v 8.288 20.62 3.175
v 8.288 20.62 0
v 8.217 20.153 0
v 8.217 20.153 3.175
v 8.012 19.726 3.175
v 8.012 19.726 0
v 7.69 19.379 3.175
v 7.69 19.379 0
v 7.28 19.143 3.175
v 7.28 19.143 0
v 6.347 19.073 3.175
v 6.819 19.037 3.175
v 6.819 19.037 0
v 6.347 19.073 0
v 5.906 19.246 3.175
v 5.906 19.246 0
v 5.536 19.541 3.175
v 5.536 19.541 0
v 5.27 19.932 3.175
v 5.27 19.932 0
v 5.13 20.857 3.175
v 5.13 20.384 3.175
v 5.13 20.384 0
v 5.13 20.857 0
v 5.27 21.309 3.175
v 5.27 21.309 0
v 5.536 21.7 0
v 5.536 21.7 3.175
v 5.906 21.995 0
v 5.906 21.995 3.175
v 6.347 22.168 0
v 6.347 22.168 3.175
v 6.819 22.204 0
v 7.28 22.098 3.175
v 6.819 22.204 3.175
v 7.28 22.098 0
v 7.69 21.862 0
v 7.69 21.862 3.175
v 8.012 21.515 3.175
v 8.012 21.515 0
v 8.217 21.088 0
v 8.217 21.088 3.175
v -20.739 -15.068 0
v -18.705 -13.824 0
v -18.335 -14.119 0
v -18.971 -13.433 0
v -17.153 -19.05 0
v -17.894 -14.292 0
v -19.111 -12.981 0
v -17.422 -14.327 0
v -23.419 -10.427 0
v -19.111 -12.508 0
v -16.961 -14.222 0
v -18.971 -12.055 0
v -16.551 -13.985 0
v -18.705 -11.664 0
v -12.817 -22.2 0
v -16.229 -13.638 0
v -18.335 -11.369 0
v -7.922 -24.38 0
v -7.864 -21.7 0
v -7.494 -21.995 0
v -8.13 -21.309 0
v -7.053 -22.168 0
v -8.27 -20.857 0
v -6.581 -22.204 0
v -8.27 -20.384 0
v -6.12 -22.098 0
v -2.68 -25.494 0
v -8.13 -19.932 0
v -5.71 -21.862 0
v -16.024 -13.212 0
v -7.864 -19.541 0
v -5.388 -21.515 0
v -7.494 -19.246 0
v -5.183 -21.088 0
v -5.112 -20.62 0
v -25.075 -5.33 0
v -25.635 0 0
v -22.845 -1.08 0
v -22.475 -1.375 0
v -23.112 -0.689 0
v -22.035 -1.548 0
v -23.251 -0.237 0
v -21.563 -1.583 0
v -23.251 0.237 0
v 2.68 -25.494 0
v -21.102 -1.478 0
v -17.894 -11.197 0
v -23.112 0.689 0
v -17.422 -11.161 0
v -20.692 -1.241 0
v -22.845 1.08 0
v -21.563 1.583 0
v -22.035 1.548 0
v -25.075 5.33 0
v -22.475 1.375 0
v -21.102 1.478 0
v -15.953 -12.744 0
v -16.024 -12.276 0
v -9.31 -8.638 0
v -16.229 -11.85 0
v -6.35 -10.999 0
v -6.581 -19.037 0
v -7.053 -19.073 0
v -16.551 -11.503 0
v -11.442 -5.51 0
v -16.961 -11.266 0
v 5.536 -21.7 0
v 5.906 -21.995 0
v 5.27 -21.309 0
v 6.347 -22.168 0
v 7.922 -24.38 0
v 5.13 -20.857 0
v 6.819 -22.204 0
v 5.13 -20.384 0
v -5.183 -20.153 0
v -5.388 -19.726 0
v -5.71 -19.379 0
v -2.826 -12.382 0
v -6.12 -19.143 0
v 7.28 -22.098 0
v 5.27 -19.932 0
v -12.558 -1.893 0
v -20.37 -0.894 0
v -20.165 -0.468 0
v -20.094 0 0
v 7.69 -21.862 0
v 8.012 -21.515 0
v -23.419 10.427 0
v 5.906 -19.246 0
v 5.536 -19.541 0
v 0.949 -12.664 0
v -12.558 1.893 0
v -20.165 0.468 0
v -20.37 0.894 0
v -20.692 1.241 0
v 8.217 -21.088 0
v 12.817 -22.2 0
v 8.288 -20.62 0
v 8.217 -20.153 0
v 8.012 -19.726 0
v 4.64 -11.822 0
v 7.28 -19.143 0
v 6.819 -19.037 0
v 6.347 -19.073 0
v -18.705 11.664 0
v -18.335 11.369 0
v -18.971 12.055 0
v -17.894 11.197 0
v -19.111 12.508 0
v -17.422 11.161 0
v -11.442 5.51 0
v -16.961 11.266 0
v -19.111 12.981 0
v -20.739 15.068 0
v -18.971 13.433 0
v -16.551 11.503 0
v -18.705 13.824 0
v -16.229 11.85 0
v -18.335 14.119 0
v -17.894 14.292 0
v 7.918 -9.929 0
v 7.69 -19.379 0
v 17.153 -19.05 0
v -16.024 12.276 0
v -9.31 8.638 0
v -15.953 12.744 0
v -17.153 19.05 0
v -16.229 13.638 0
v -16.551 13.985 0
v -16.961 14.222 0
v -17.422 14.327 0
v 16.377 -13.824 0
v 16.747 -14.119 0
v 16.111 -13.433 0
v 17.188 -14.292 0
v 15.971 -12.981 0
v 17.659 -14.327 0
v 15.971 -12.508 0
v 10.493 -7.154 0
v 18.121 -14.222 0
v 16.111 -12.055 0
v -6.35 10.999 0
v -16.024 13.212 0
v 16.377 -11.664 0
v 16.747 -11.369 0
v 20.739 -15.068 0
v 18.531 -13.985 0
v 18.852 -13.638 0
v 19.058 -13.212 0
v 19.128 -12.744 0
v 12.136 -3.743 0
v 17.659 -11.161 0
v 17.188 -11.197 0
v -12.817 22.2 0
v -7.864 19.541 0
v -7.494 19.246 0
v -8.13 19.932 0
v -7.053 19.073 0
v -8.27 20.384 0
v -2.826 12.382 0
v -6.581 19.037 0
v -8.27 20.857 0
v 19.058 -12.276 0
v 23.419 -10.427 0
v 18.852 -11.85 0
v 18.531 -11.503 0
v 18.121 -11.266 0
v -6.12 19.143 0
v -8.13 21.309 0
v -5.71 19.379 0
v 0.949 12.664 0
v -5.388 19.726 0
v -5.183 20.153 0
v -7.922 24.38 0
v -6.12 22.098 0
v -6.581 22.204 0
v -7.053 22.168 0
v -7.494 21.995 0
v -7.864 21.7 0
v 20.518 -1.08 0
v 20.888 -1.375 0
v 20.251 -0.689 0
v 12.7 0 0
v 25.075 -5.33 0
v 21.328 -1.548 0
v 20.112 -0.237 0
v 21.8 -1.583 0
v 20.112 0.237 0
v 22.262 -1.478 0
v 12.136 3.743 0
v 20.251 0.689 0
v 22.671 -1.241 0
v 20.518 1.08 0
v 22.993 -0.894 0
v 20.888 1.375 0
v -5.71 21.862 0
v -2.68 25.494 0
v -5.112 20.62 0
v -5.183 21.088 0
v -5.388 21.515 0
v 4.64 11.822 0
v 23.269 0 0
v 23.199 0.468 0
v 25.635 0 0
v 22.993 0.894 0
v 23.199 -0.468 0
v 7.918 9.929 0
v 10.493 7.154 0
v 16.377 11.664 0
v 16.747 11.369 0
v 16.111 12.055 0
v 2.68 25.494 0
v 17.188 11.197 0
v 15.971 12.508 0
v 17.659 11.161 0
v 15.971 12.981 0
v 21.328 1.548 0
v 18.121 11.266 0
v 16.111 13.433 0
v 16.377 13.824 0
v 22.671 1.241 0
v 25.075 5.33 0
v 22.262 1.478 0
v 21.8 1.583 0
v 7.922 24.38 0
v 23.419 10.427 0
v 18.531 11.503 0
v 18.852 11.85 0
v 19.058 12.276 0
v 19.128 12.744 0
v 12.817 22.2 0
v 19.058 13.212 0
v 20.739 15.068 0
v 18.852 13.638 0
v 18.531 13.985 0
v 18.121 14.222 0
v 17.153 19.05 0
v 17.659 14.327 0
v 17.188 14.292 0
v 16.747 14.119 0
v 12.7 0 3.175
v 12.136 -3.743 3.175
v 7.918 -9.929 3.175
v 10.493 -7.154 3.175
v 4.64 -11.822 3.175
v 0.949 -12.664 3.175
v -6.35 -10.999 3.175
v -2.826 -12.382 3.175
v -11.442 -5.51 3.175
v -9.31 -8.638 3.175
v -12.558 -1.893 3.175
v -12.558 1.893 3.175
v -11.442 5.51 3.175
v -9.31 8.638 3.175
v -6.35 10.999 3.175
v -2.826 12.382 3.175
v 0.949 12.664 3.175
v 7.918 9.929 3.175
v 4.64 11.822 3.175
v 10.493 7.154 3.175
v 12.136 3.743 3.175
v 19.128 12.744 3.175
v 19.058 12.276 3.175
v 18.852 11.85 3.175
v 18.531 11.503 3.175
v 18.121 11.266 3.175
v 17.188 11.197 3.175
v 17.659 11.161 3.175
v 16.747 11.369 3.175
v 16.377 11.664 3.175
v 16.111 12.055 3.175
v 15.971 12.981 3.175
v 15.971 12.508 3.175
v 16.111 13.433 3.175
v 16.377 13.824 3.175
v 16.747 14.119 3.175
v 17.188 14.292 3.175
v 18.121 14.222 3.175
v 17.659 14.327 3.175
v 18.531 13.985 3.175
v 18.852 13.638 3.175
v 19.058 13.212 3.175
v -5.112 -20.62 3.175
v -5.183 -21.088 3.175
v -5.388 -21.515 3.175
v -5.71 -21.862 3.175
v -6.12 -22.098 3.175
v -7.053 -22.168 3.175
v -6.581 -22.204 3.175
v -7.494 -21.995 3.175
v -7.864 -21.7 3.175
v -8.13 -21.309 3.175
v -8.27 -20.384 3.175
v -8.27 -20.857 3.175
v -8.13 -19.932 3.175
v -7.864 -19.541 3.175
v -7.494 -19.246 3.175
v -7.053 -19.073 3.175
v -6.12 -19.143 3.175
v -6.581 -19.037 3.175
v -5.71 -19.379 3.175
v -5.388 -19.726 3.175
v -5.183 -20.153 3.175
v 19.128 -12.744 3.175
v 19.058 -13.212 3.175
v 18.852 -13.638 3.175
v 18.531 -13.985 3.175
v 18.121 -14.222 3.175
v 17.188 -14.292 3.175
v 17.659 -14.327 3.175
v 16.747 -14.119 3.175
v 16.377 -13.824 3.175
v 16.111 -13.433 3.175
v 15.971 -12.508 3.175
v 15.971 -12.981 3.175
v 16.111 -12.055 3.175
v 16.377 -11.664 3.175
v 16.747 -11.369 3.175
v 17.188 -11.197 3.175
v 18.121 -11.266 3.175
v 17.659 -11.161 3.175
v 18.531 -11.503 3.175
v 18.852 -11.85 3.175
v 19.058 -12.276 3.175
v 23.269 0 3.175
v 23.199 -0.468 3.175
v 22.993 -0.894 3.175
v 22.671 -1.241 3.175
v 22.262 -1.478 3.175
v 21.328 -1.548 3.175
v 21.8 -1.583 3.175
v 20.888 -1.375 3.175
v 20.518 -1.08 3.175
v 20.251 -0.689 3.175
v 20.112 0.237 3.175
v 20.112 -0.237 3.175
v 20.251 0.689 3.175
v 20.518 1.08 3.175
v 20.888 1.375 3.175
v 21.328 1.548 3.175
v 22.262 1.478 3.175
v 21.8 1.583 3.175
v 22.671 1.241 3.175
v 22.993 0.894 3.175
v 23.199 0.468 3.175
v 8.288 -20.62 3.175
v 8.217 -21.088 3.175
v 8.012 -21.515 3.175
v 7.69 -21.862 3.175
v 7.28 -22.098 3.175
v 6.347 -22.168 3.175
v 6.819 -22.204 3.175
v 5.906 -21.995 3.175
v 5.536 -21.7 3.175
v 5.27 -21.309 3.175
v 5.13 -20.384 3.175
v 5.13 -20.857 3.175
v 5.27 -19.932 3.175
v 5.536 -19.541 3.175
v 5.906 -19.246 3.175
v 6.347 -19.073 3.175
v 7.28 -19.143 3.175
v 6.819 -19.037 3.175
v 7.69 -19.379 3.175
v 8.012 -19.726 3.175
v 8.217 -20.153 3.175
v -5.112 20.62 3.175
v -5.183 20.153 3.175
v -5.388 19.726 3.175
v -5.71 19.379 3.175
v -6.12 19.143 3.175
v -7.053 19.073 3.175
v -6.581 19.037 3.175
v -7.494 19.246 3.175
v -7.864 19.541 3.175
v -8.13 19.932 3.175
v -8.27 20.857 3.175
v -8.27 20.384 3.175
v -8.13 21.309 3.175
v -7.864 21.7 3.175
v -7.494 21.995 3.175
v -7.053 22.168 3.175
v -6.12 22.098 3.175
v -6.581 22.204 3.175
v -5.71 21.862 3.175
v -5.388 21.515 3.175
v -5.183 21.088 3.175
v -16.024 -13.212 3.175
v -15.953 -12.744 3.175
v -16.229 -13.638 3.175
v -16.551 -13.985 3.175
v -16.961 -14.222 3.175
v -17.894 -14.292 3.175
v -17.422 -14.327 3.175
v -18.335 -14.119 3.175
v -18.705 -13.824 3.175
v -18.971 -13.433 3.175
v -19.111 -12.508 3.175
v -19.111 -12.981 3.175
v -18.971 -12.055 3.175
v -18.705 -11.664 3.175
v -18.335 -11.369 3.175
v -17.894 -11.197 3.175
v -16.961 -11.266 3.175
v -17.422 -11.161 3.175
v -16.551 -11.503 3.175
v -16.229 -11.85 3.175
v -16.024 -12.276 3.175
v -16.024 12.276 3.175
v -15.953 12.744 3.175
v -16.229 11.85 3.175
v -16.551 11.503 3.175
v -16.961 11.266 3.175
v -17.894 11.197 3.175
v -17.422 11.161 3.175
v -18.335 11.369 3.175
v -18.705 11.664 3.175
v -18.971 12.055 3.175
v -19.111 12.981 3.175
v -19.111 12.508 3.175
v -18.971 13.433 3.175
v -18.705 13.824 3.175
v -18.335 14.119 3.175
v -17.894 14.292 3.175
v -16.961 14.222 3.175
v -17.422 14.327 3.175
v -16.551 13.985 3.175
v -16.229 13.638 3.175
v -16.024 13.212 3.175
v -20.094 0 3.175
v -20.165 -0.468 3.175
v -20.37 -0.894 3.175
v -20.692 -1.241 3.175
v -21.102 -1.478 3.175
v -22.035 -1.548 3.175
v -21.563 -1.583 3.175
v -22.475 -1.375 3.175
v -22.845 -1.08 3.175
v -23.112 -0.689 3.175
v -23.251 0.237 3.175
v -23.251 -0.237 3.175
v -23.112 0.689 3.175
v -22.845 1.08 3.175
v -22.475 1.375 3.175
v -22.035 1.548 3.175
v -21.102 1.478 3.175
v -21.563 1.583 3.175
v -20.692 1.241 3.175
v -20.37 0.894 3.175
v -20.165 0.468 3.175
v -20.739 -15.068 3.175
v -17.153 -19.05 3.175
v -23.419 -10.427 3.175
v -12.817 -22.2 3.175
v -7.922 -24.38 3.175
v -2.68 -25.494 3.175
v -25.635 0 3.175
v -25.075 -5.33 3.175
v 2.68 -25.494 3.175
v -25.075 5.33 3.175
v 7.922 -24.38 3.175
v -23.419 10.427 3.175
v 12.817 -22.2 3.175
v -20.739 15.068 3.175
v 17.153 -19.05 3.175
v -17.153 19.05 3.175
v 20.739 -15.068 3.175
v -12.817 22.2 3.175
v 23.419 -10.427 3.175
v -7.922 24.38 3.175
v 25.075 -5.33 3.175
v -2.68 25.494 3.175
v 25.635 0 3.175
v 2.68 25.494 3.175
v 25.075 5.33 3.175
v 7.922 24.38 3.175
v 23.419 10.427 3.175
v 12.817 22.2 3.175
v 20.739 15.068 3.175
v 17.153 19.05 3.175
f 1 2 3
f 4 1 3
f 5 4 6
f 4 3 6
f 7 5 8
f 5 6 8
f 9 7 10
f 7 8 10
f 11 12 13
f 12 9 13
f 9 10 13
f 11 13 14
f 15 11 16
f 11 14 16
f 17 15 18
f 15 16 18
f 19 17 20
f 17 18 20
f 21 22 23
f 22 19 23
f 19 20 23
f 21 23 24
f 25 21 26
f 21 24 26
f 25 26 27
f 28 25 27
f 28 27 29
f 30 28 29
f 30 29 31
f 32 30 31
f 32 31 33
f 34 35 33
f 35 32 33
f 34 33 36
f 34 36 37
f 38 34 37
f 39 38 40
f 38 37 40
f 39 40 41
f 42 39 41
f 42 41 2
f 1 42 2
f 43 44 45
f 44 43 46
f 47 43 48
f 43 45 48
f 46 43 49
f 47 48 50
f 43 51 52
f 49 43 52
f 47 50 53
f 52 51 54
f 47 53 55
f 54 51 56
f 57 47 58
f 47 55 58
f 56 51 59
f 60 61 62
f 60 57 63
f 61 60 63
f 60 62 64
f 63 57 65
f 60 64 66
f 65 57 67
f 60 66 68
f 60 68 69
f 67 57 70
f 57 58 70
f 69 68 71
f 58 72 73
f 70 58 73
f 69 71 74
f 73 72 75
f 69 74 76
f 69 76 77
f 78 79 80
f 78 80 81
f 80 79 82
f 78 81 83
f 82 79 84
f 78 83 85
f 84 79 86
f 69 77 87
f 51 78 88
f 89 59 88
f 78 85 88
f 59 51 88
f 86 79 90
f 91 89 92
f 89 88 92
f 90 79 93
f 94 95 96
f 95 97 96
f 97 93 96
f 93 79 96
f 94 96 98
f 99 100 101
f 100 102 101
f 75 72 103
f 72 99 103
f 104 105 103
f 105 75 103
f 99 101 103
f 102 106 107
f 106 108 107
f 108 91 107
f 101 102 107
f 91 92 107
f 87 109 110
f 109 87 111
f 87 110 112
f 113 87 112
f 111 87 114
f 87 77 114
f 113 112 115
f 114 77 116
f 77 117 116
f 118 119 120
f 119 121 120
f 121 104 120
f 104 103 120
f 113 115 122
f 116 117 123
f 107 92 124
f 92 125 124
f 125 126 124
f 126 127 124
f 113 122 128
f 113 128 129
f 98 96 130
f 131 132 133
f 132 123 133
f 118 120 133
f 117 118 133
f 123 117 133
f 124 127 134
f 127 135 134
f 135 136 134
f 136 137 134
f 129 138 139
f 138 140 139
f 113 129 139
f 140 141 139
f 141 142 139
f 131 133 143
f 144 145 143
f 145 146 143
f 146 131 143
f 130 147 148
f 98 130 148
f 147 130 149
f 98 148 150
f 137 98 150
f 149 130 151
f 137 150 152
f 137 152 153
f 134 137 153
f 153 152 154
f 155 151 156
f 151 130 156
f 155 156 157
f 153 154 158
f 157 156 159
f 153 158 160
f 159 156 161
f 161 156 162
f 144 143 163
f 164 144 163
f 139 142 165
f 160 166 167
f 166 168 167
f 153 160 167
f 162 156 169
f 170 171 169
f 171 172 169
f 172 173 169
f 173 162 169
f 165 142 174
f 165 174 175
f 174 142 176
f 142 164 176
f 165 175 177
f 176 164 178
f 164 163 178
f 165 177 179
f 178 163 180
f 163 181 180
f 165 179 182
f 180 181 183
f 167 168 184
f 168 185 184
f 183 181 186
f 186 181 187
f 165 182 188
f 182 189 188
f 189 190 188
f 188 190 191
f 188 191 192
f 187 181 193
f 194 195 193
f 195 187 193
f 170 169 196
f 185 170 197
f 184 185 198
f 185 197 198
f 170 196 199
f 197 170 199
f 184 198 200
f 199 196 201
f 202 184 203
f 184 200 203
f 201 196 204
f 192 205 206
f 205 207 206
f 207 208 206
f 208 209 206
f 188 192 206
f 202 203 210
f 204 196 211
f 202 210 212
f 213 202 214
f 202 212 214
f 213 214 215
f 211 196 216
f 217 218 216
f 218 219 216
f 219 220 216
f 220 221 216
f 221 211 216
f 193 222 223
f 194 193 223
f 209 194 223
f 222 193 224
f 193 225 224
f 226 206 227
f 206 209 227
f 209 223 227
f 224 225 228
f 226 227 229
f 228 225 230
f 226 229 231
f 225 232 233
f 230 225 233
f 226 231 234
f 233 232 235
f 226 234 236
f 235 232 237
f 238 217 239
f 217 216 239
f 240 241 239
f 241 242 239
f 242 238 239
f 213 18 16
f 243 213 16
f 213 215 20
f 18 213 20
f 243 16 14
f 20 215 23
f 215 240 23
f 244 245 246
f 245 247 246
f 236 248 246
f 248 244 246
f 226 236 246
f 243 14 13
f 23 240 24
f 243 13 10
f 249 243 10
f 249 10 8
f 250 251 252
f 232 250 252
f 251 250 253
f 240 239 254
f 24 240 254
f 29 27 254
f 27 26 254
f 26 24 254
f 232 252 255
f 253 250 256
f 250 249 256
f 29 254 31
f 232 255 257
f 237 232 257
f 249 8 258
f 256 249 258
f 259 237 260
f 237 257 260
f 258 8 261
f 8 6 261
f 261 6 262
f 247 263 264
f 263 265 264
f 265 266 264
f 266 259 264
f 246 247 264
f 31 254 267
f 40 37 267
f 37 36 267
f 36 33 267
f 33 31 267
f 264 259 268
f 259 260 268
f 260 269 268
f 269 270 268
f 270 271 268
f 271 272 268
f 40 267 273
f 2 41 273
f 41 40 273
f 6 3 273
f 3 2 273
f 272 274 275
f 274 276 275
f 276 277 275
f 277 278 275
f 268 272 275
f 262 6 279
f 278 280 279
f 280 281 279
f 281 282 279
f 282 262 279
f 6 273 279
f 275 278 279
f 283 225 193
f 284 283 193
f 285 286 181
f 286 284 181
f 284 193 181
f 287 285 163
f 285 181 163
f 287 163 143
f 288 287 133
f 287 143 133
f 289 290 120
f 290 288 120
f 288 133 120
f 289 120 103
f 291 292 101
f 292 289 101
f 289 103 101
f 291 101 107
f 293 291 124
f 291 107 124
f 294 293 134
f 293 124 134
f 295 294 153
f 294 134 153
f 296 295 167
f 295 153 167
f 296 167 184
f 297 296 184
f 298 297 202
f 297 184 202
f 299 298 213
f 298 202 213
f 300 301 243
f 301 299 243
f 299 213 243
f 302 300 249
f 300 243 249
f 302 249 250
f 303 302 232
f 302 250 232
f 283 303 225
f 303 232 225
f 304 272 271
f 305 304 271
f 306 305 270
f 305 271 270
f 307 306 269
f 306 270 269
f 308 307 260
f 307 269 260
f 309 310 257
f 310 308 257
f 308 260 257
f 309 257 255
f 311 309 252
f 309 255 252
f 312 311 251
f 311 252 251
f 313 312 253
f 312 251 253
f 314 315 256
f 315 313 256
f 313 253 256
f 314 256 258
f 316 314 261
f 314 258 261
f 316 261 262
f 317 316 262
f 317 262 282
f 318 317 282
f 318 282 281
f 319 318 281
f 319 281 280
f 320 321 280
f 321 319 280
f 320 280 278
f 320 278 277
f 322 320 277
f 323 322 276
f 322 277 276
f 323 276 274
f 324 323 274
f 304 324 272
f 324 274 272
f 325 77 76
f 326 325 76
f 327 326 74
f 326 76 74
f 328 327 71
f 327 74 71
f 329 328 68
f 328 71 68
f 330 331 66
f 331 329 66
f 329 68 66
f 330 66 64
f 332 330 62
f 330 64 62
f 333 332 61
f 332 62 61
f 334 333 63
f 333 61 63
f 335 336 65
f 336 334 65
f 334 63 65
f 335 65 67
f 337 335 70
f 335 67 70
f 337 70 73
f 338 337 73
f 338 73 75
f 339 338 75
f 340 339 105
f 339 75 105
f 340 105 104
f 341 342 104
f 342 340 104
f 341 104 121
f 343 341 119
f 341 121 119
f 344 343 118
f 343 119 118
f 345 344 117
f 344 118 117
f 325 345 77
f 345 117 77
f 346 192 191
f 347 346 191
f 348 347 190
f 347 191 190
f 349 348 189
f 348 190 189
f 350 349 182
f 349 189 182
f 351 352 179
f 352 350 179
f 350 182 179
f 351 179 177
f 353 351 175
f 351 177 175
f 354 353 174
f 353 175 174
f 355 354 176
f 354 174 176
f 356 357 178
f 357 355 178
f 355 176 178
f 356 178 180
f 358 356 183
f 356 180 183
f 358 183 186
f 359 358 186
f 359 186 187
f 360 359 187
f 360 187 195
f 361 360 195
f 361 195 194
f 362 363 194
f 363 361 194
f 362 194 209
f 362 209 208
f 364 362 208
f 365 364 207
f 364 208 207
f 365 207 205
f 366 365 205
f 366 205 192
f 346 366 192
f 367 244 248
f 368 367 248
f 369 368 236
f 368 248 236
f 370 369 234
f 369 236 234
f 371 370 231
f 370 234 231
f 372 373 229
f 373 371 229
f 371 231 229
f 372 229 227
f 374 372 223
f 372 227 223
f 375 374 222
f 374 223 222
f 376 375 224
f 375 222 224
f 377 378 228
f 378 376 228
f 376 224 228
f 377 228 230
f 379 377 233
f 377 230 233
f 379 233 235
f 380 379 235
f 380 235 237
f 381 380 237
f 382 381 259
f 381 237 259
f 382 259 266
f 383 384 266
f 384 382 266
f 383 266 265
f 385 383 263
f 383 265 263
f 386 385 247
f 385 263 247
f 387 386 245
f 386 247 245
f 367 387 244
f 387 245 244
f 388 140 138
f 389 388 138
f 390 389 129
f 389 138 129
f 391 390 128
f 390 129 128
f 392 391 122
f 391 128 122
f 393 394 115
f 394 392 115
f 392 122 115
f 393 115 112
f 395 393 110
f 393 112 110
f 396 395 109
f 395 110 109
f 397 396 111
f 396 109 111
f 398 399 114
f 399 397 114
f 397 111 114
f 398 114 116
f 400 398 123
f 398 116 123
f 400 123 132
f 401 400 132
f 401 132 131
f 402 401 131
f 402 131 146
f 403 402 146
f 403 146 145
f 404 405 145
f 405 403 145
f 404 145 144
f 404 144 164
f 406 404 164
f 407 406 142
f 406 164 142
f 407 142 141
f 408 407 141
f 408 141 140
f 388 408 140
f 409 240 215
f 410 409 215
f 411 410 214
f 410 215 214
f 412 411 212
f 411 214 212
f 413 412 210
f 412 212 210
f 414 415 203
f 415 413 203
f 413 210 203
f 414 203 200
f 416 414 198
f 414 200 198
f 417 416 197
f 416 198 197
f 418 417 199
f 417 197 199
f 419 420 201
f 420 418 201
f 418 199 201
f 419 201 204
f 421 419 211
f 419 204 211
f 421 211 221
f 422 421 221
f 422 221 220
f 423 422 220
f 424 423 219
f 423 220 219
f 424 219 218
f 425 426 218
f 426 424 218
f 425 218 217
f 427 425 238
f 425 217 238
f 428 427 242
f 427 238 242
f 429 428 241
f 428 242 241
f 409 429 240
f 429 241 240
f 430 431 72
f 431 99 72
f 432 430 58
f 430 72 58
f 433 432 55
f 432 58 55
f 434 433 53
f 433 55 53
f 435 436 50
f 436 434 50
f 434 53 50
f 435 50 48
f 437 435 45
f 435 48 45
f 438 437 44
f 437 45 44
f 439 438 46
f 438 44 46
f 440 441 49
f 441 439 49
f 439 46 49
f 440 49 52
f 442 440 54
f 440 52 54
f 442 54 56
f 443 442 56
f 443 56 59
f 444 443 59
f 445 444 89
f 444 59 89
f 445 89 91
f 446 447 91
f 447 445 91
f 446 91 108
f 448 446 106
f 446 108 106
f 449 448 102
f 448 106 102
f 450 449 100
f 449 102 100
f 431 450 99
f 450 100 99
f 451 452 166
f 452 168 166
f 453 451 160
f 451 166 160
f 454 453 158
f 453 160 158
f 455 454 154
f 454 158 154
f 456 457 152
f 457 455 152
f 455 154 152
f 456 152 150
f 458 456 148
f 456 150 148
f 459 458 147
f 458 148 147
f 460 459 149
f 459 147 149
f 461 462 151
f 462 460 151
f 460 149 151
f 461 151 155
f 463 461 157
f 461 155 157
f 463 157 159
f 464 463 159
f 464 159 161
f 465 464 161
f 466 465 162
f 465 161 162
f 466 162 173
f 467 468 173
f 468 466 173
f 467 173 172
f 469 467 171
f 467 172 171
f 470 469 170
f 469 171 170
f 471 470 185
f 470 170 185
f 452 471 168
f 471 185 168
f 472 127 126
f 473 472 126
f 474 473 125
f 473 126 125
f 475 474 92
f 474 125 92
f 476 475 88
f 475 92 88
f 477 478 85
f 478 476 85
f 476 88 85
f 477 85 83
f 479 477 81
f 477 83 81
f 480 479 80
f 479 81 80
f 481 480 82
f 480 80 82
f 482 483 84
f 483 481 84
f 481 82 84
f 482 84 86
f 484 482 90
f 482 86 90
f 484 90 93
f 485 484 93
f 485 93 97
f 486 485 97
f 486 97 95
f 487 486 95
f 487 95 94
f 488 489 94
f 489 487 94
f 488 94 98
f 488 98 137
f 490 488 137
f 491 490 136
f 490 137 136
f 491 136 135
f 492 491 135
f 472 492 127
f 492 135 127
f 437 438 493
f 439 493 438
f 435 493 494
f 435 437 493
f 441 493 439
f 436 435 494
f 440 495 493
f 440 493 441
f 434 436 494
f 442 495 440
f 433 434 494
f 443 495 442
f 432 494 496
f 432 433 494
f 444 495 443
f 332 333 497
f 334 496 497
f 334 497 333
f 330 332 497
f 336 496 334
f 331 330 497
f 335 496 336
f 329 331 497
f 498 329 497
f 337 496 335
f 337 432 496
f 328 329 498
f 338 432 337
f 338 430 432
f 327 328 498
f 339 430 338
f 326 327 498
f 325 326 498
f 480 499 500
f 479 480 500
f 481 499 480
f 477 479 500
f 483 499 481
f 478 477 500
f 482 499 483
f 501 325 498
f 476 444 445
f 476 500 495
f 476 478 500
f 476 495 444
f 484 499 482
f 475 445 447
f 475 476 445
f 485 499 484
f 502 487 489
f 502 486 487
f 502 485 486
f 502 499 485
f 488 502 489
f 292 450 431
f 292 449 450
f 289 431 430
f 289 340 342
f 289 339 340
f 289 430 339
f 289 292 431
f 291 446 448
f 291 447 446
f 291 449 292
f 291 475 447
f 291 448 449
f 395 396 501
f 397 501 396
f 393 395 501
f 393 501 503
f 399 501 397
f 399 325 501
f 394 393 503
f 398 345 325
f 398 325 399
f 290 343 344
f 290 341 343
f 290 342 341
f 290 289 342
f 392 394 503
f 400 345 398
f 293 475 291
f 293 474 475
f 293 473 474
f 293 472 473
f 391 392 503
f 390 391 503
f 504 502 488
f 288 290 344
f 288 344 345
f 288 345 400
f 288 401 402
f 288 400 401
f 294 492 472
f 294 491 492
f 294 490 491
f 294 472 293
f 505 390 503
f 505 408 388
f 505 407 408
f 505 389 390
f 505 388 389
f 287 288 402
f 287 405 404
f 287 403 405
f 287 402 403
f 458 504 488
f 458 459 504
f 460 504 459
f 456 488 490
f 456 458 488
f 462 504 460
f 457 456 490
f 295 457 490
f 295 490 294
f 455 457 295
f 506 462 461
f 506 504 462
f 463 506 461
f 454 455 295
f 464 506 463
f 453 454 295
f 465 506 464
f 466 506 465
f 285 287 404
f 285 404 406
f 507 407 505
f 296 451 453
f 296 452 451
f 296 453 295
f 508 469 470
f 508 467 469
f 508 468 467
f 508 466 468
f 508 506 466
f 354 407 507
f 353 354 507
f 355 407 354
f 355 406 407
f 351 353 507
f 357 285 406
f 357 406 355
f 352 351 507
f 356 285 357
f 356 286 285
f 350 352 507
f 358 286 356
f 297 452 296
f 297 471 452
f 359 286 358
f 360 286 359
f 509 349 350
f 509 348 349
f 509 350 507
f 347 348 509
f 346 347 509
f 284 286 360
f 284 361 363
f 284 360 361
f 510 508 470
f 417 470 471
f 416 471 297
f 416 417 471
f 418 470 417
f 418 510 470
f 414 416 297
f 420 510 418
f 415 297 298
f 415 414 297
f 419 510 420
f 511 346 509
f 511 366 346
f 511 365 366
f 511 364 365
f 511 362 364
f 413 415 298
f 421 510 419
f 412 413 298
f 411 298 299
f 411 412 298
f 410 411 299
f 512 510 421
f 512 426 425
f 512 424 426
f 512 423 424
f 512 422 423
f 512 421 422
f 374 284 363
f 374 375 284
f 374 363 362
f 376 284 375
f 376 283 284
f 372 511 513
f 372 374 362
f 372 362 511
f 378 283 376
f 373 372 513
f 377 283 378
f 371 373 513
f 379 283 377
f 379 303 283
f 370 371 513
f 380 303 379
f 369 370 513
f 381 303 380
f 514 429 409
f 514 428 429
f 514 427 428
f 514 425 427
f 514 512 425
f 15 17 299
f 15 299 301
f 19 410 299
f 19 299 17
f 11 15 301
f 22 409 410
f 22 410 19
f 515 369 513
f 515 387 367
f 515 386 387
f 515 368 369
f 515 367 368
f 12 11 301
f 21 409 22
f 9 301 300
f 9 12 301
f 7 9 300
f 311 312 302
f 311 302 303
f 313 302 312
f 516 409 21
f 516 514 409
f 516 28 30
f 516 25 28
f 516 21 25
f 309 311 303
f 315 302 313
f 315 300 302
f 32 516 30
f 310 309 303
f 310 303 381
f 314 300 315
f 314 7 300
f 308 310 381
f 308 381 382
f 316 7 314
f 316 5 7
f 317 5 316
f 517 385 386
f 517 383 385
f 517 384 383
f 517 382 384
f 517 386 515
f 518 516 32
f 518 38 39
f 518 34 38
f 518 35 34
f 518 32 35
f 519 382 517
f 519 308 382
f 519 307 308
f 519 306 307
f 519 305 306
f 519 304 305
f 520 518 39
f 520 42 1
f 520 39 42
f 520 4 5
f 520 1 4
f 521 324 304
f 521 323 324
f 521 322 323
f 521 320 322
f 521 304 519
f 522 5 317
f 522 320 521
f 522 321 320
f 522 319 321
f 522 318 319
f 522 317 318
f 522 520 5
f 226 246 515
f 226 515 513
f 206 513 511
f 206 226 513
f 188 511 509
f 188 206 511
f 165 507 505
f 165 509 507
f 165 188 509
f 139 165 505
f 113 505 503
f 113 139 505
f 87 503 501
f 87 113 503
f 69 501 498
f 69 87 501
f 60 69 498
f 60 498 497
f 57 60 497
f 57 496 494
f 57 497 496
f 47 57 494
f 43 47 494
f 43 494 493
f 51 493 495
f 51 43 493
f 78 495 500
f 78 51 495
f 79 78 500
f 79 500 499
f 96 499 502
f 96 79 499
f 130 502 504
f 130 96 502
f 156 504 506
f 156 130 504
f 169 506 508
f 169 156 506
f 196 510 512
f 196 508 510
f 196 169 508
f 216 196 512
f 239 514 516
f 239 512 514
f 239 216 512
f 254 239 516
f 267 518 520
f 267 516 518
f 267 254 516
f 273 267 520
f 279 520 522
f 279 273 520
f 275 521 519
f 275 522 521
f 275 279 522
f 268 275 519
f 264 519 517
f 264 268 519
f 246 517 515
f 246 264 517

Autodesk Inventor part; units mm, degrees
ref_plane "YZ Plane" through (0, 0, 0) normal (1, 0, 0) x (0, 1, 0)
ref_plane "XZ Plane" through (0, 0, 0) normal (0, 1, 0) x (-1, 0, 0)
ref_plane "XY Plane" through (0, 0, 0) normal (0, 0, 1) x (1, 0, 0)
ref_plane "Work Plane1" through (0, 0, 0) normal (0, 0, 1) x (1, 0, 0)
sketch "Sketch1" plane through (0, 0, 0) normal (0, 0, 1) x (1, 0, 0)
  circle A0 centre (0, 0) radius 25.6348 projected
  circle A1 centre (0, 0) radius 12.7 projected
  circle A2 centre (6.7, 20.6205) radius 1.5875 projected
  circle A3 centre (17.5408, 12.7442) radius 1.5875 projected
  circle A4 centre (21.6817, 0) radius 1.5875 projected
  circle A5 centre (17.5408, -12.7442) radius 1.5875 projected
  circle A6 centre (6.7, -20.6205) radius 1.5875 projected
  circle A7 centre (-6.7, -20.6205) radius 1.5875 projected
  circle A8 centre (-17.5408, -12.7442) radius 1.5875 projected
  circle A9 centre (-21.6817, 0) radius 1.5875 projected
  circle A10 centre (-17.5408, 12.7442) radius 1.5875 projected
  circle A11 centre (-6.7, 20.6205) radius 1.5875 projected
  point P0 (0, 0)
extrude "Extrusion1" add sketch "Sketch1" along normal blind 3.175
properties part number "basePlate" material "Polycarbonate, Clear"
